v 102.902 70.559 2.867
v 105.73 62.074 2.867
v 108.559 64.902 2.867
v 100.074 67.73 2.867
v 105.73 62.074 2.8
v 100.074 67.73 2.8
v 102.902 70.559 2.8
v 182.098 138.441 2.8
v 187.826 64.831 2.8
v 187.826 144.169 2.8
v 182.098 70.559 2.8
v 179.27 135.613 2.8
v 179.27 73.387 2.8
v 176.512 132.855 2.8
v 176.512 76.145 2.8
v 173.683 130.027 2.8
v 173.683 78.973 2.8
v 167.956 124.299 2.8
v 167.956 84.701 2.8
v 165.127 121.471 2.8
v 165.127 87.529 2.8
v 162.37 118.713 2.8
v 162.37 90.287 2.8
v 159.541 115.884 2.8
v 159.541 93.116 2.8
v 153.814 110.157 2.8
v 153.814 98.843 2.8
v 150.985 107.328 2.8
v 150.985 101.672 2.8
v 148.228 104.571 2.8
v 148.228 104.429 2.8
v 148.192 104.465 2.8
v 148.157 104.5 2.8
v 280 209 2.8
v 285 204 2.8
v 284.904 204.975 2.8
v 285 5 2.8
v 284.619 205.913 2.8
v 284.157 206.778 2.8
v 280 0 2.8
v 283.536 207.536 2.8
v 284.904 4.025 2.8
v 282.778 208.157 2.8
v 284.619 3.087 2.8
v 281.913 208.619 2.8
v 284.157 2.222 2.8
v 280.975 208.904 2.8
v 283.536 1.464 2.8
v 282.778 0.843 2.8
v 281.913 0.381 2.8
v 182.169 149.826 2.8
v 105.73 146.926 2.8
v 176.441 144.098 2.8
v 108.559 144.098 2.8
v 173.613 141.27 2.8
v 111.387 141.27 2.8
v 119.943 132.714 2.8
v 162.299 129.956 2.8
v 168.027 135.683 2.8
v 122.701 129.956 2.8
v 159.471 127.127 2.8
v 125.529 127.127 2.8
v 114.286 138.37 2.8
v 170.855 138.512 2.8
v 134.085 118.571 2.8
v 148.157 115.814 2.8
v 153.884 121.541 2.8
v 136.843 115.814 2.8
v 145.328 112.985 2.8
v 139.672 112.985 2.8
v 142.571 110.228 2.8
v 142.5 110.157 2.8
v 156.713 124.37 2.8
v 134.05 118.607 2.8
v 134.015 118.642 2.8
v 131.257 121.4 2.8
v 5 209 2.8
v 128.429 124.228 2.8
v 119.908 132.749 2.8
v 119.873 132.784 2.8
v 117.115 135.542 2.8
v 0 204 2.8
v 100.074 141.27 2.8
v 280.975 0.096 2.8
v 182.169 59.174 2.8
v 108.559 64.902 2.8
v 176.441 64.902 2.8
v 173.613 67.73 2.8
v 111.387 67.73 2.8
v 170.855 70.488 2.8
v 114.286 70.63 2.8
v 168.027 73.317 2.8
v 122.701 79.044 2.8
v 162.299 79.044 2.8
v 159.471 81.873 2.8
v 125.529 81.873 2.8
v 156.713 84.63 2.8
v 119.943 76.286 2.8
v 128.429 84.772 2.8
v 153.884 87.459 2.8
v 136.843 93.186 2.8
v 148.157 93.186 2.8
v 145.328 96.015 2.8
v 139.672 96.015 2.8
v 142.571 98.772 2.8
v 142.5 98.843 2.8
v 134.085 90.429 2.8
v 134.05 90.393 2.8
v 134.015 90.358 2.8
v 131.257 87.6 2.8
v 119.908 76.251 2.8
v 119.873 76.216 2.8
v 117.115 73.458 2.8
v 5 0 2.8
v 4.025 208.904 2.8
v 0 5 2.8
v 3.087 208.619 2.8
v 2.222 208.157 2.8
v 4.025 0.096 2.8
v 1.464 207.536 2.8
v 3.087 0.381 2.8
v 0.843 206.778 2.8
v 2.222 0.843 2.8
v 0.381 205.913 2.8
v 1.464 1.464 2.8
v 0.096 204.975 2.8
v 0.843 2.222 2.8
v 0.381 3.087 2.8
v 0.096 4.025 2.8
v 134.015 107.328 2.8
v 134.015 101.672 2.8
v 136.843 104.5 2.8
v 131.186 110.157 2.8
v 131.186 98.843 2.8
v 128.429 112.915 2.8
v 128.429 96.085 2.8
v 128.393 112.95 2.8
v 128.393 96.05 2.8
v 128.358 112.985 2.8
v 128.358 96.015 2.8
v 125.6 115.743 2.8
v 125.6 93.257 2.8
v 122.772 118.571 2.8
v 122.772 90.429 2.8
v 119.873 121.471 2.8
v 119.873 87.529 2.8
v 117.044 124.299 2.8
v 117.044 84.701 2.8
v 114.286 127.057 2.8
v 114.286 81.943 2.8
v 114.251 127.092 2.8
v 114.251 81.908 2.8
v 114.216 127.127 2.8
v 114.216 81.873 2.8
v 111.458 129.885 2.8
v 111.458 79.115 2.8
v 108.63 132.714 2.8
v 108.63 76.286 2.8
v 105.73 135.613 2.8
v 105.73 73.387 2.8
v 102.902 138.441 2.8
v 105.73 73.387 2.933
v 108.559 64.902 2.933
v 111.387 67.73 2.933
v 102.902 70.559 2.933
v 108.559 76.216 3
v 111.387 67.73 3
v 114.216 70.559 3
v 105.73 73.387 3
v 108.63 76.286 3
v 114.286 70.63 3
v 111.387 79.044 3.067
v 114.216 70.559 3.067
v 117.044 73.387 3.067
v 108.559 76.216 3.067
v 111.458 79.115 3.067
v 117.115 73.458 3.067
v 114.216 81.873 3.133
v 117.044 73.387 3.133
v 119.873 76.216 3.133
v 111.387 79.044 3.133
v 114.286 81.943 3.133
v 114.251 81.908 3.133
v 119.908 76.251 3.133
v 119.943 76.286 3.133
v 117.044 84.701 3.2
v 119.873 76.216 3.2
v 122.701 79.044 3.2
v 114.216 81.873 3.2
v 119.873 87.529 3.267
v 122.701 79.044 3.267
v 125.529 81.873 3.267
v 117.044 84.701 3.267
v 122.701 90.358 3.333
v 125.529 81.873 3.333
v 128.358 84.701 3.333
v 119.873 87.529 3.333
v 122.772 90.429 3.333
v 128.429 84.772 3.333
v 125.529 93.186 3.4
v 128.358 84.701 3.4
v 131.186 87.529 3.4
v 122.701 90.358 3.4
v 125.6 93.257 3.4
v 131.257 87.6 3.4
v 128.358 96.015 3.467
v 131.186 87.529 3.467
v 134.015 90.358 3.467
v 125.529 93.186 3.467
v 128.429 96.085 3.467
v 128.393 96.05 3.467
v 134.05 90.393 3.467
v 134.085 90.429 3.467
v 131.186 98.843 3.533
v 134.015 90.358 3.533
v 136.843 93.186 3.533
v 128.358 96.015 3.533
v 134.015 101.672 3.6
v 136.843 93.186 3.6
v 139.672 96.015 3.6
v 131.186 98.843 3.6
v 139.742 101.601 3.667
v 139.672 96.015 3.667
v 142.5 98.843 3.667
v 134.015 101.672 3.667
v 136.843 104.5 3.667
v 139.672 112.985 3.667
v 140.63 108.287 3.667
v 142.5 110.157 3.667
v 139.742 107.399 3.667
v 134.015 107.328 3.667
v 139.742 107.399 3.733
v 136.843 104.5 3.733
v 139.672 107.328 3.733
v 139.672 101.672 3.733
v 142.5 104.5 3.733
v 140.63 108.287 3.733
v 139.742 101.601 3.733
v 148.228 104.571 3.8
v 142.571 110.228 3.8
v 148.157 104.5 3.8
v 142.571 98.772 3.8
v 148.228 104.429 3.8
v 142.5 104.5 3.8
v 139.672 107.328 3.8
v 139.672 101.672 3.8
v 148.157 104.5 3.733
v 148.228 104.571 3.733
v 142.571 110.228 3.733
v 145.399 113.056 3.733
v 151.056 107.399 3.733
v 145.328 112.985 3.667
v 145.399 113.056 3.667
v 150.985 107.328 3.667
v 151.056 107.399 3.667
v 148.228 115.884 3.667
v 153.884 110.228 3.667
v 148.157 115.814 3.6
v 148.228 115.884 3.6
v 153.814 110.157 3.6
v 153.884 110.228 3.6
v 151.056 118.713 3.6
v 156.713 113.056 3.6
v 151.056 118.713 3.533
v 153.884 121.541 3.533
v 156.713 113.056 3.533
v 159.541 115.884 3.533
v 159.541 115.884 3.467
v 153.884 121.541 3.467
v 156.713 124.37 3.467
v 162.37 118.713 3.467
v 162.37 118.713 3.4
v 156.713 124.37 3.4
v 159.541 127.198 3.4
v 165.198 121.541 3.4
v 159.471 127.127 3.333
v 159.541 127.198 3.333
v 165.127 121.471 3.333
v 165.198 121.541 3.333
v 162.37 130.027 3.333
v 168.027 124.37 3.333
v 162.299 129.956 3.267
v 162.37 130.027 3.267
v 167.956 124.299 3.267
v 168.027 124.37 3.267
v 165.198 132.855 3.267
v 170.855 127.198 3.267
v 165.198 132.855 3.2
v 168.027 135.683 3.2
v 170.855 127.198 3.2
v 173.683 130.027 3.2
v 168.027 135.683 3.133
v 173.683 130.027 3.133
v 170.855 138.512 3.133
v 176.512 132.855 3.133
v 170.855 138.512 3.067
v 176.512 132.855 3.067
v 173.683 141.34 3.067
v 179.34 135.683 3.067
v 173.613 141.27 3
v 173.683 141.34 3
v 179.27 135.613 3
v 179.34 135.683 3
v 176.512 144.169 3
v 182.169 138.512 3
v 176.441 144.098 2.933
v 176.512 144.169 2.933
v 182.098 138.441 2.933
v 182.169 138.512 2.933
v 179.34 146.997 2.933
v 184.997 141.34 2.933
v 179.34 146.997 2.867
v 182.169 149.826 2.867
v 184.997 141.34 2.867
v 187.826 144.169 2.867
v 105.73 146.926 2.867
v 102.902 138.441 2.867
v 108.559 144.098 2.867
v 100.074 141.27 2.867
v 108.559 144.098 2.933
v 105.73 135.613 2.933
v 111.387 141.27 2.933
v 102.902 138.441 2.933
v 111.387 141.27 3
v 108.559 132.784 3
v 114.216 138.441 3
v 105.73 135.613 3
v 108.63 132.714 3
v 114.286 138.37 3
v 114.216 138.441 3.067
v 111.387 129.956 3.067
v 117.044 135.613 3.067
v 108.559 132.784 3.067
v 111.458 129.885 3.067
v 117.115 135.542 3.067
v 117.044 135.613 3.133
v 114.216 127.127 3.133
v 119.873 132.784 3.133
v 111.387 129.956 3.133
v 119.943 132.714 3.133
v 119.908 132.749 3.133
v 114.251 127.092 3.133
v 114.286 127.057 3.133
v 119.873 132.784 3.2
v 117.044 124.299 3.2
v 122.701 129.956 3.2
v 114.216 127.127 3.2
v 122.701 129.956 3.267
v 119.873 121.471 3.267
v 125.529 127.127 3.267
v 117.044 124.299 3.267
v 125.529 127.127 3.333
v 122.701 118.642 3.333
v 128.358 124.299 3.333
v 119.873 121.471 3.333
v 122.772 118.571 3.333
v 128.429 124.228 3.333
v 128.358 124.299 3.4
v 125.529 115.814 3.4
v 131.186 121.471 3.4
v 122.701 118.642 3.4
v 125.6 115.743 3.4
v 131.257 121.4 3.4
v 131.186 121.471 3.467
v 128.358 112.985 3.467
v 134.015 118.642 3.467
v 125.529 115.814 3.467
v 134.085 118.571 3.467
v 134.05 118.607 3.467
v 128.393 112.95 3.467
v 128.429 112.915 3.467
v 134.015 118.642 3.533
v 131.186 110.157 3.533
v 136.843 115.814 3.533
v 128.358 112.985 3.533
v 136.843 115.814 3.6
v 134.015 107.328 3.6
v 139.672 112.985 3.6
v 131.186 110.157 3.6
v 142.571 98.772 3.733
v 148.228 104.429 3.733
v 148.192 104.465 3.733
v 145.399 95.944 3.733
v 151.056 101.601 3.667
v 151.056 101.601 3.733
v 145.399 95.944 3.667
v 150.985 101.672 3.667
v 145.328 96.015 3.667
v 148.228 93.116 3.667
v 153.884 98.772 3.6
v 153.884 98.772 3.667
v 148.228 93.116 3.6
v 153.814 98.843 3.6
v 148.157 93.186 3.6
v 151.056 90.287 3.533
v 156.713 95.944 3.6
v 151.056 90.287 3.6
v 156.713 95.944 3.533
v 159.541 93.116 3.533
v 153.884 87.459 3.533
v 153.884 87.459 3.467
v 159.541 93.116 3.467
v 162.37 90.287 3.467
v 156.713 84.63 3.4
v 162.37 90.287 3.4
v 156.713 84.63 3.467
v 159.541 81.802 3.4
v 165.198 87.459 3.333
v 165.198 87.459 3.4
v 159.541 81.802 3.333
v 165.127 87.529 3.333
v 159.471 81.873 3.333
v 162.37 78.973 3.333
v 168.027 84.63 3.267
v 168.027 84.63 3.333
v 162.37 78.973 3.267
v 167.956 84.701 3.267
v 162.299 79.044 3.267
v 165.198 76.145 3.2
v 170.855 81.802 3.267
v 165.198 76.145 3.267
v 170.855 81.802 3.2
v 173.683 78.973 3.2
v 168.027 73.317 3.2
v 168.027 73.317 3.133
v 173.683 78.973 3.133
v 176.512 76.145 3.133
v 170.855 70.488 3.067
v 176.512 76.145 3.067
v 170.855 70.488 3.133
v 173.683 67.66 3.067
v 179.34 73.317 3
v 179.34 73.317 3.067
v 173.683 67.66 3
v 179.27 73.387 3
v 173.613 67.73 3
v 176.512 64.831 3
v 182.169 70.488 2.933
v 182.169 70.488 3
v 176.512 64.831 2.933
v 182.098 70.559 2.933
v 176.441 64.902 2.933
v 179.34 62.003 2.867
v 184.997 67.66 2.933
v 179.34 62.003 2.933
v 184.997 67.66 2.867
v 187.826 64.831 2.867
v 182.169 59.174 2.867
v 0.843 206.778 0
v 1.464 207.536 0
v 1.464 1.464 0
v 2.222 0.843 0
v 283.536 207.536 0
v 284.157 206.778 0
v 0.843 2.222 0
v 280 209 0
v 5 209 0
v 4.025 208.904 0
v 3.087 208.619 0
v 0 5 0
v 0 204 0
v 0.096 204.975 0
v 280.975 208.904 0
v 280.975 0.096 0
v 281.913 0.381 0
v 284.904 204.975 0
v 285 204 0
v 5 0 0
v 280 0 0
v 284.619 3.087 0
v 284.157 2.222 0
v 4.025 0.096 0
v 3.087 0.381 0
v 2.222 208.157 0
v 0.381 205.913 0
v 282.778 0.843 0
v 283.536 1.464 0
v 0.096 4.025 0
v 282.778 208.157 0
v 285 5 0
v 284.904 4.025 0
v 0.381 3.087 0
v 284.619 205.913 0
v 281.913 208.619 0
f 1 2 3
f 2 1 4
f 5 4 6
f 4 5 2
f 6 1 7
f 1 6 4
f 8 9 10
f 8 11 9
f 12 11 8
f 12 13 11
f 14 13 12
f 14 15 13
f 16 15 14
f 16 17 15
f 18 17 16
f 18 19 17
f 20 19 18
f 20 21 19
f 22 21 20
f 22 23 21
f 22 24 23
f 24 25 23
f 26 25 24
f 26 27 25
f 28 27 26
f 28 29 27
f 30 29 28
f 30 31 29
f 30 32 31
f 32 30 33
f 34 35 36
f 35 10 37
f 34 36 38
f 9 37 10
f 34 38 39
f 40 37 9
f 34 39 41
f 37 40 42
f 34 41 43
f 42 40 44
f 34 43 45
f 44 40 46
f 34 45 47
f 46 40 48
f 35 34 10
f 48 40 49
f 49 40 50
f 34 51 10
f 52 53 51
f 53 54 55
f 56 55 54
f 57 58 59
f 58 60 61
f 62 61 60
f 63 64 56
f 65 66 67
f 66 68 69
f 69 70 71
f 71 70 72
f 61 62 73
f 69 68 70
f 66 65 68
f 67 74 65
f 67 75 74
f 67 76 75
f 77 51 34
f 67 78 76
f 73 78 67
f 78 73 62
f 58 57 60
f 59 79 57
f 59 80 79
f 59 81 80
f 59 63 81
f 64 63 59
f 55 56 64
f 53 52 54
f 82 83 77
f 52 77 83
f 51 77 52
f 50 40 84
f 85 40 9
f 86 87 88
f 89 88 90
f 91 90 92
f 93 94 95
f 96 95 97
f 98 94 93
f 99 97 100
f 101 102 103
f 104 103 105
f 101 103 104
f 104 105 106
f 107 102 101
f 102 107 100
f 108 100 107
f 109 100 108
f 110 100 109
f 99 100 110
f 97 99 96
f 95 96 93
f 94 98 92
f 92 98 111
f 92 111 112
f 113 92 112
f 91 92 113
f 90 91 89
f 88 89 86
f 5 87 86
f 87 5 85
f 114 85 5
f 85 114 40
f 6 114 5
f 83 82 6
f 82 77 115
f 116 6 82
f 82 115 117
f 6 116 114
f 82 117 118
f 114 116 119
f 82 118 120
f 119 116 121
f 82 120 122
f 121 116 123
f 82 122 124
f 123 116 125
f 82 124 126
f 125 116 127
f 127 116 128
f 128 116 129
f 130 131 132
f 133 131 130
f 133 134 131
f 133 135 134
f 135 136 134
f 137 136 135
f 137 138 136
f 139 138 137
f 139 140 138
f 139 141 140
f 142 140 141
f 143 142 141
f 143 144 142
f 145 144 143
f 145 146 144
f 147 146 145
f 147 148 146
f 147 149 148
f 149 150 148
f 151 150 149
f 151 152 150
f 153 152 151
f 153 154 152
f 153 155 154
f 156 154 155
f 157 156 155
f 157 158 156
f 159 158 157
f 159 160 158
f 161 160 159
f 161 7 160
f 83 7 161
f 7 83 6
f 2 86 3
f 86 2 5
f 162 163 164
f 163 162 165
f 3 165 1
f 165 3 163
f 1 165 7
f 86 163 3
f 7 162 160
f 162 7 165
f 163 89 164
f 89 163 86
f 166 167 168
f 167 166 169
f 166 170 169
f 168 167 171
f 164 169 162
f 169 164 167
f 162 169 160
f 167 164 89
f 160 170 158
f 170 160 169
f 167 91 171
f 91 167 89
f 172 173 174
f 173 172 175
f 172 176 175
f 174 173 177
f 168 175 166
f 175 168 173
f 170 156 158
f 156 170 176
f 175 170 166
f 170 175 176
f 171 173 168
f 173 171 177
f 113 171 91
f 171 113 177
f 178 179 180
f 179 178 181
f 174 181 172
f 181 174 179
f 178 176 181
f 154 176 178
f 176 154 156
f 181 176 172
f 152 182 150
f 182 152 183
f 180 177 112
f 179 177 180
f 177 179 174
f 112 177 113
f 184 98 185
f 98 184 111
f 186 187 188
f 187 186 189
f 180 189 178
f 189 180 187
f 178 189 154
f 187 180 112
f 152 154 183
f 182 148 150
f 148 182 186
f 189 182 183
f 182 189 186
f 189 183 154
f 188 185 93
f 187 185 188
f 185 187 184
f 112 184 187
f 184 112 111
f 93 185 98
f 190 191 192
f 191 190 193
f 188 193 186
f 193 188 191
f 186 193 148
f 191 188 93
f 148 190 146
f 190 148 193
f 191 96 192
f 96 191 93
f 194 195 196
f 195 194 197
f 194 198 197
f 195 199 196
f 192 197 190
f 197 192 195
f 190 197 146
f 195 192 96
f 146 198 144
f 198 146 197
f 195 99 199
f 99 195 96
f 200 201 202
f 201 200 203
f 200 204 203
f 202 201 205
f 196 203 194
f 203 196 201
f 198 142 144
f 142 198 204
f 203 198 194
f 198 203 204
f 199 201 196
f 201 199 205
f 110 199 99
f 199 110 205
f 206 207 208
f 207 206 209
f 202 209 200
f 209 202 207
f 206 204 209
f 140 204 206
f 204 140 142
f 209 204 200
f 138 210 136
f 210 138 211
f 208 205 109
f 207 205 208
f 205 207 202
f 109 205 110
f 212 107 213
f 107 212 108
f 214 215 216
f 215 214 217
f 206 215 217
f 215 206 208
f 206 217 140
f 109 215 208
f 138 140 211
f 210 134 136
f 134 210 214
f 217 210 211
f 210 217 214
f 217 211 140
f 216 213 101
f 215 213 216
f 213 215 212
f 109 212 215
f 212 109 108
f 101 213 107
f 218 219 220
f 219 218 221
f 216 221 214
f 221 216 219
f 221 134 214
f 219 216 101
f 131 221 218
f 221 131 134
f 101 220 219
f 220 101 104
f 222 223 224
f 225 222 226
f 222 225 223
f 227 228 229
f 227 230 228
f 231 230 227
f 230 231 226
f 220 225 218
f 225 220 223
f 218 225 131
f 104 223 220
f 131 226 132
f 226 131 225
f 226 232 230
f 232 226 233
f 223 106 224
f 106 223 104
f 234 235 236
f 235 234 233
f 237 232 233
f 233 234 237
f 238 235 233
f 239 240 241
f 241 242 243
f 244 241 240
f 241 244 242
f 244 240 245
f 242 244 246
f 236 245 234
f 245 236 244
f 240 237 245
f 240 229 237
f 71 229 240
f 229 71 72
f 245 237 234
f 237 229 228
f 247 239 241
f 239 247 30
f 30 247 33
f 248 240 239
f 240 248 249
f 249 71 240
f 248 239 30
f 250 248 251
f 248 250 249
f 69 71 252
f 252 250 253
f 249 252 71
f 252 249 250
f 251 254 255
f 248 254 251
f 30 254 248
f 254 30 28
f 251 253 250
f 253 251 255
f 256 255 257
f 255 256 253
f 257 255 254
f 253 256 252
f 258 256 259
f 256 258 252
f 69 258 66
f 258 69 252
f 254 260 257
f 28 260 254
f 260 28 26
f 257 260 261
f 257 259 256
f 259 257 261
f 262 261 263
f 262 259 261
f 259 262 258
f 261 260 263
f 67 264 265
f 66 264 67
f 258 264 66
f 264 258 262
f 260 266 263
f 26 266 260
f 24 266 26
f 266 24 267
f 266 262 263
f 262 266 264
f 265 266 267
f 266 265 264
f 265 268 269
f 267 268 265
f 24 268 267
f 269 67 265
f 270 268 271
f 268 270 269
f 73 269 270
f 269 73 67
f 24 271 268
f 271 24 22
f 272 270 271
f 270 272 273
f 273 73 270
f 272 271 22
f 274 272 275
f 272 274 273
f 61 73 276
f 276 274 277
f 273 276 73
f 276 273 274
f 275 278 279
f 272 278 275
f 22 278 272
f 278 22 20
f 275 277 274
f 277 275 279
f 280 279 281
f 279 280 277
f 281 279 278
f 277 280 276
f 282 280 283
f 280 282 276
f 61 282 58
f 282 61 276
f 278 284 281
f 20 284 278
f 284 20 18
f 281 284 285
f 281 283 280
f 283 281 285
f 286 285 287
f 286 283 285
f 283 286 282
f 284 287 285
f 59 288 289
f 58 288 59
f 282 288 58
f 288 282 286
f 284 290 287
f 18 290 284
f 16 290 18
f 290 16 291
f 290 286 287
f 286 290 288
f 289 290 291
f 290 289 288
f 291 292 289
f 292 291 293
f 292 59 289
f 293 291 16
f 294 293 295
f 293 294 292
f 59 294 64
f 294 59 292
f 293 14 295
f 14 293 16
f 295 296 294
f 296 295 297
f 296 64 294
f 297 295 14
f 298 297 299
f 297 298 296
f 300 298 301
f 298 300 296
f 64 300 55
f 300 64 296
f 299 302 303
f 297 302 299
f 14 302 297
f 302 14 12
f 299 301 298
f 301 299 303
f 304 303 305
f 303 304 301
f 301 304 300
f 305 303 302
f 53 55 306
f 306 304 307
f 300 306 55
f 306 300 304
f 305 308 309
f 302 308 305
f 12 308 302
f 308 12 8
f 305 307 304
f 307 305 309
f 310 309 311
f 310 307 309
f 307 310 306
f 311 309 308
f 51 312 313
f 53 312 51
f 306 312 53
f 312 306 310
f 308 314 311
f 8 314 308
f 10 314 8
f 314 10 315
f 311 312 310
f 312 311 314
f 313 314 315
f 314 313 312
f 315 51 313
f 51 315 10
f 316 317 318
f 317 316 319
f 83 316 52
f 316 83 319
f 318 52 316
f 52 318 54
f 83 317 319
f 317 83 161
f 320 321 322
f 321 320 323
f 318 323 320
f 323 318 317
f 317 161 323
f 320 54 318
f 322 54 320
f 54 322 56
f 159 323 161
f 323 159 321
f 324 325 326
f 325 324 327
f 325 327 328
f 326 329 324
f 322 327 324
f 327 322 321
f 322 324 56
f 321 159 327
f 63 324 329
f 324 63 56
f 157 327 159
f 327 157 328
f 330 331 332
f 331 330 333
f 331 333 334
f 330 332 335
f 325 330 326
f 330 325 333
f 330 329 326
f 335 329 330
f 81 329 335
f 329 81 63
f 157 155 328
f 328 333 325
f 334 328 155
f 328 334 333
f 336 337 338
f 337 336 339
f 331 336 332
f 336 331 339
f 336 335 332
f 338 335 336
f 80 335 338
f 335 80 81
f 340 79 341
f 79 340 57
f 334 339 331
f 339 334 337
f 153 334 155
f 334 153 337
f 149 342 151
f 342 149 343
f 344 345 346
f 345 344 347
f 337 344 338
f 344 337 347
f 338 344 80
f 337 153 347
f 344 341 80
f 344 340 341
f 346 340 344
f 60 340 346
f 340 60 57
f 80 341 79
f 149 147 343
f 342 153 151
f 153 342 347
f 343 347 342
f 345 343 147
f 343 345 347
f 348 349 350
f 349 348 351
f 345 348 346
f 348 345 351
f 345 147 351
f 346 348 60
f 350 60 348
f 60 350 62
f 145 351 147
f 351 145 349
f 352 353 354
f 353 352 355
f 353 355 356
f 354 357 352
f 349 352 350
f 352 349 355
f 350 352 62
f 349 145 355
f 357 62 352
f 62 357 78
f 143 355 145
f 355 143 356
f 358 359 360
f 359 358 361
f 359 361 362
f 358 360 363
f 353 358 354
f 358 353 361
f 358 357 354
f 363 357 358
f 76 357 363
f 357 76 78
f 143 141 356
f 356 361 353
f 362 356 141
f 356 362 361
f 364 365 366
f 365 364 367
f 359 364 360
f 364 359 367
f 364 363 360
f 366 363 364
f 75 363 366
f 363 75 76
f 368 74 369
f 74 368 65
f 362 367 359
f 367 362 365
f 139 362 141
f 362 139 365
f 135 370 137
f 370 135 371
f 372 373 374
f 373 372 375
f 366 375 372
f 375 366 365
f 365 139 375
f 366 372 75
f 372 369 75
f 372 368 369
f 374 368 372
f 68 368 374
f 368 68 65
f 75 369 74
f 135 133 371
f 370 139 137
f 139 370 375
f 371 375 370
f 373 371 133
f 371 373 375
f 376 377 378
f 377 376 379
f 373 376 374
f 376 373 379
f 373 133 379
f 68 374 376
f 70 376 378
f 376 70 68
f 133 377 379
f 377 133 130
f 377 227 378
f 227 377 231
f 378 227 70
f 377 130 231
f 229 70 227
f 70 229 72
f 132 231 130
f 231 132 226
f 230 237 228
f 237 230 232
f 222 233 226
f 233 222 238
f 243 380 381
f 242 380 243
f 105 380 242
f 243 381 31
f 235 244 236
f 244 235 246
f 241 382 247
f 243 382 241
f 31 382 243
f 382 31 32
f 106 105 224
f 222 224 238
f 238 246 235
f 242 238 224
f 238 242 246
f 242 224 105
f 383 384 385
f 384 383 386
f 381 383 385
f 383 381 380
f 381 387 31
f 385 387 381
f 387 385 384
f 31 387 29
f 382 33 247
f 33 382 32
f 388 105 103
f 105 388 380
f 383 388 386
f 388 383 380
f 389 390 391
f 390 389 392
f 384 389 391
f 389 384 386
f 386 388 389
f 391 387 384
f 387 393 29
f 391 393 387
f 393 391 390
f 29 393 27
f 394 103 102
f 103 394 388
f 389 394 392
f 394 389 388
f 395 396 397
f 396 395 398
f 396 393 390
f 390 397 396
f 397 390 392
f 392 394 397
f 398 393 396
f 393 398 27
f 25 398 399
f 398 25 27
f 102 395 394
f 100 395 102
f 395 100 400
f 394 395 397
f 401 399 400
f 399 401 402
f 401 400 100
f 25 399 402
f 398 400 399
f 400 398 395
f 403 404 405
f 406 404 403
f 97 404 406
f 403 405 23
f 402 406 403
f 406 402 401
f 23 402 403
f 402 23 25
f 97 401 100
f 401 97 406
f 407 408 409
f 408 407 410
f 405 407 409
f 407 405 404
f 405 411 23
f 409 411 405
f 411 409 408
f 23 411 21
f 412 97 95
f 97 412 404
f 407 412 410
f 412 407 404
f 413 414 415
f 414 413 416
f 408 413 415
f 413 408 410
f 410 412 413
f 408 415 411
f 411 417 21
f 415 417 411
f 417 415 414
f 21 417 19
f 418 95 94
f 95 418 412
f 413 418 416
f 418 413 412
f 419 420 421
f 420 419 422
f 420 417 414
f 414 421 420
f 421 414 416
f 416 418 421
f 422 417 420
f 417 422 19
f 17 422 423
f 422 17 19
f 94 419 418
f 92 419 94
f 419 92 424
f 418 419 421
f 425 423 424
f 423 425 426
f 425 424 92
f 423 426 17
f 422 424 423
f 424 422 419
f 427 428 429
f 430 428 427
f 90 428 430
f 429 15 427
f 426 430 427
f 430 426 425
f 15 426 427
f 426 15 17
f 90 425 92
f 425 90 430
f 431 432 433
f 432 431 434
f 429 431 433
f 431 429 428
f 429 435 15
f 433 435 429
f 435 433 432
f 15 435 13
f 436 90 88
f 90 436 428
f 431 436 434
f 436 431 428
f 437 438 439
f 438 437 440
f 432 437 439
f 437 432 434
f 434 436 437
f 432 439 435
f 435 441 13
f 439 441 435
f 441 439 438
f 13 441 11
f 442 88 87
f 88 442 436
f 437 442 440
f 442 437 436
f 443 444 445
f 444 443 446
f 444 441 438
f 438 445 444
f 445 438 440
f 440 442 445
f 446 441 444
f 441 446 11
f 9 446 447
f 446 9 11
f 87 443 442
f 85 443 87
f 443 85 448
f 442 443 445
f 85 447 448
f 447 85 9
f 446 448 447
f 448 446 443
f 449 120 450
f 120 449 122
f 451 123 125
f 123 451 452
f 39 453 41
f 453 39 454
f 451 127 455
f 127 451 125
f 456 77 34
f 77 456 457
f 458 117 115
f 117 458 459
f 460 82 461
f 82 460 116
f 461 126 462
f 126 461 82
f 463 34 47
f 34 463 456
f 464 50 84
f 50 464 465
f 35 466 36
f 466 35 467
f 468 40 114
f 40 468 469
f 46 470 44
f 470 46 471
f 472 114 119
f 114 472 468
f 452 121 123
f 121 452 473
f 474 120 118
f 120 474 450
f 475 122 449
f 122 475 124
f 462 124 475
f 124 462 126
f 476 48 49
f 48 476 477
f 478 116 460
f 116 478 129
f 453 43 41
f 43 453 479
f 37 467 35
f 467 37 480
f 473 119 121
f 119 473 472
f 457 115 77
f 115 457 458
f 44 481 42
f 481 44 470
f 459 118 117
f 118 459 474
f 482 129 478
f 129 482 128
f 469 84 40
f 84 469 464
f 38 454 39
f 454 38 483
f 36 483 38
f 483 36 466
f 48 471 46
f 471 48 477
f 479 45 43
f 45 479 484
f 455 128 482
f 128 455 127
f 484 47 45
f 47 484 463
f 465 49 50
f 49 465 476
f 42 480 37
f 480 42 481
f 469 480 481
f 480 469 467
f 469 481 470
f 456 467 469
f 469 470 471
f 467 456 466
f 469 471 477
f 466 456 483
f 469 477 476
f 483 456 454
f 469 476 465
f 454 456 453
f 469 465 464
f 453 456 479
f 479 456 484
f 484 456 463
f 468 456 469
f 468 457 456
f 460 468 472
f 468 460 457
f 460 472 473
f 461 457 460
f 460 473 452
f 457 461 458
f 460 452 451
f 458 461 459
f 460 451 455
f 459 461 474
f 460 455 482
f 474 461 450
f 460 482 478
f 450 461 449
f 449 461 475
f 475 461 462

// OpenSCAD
// 机箱前面板
// 尺寸: 285mm x 209mm x 2.8mm
// 四角倒角设计
// 中心凸起 X 图案

// 参数
width = 285;     // 宽度 (mm)
height = 209;    // 高度 (mm)
thickness = 2.8; // 厚度 (mm)
corner_radius = 5;  // 倒角半径 (mm)

// X 图案参数
x_max_height = 1.0;  // X 中心最大凸起高度 (mm)
x_width = 8;         // X 线条宽度 (mm)
x_diagonal = 120;    // X 对角线长度 (mm)

// 圆角矩形模块
module rounded_rect(w, h, r, t) {
    hull() {
        translate([r, r, 0]) cylinder(h = t, r = r, $fn = 32);
        translate([w - r, r, 0]) cylinder(h = t, r = r, $fn = 32);
        translate([w - r, h - r, 0]) cylinder(h = t, r = r, $fn = 32);
        translate([r, h - r, 0]) cylinder(h = t, r = r, $fn = 32);
    }
}

// 创建前面板
color("LightGray") {
    rounded_rect(width, height, corner_radius, thickness);
}

// X 图案模块 - 中心凸起向边缘渐变
module x_pattern() {
    center_x = width / 2;
    center_y = height / 2;

    // 使用分段堆叠实现沿X方向的渐变
    segments = 30;  // 每条线分为多少段
    segment_length = x_diagonal / segments;

    union() {
        // 第一条对角线 (从左下到右上)
        for (i = [-segments/2:segments/2-1]) {
            // 距离中心的相对距离 (0 到 0.5)
            dist_ratio = abs(i) / (segments/2);

            // 当前段的高度：中心1mm，边缘0mm
            current_height = x_max_height * (1 - dist_ratio);

            translate([center_x, center_y, thickness])
            rotate([0, 0, 45])
            translate([i * segment_length, -x_width/2, 0])
            cube([segment_length + 0.1, x_width, current_height]);
        }

        // 第二条对角线 (从左上到右下)
        for (i = [-segments/2:segments/2-1]) {
            dist_ratio = abs(i) / (segments/2);
            current_height = x_max_height * (1 - dist_ratio);

            translate([center_x, center_y, thickness])
            rotate([0, 0, -45])
            translate([i * segment_length, -x_width/2, 0])
            cube([segment_length + 0.1, x_width, current_height]);
        }
    }
}

// 添加 X 图案
color("DarkGray") {
    x_pattern();
}

// 简单的倒角版本备选（使用 chamfer）
// module chamfered_rect(w, h, c, t) {
//     minkowski() {
//         translate([c, c, 0]) cube([w - 2*c, h - 2*c, t]);
//         cylinder(h = c, r = c, $fn = 32);
//     }
// }
//
// chamfered_rect(width, height, corner_radius, thickness);
